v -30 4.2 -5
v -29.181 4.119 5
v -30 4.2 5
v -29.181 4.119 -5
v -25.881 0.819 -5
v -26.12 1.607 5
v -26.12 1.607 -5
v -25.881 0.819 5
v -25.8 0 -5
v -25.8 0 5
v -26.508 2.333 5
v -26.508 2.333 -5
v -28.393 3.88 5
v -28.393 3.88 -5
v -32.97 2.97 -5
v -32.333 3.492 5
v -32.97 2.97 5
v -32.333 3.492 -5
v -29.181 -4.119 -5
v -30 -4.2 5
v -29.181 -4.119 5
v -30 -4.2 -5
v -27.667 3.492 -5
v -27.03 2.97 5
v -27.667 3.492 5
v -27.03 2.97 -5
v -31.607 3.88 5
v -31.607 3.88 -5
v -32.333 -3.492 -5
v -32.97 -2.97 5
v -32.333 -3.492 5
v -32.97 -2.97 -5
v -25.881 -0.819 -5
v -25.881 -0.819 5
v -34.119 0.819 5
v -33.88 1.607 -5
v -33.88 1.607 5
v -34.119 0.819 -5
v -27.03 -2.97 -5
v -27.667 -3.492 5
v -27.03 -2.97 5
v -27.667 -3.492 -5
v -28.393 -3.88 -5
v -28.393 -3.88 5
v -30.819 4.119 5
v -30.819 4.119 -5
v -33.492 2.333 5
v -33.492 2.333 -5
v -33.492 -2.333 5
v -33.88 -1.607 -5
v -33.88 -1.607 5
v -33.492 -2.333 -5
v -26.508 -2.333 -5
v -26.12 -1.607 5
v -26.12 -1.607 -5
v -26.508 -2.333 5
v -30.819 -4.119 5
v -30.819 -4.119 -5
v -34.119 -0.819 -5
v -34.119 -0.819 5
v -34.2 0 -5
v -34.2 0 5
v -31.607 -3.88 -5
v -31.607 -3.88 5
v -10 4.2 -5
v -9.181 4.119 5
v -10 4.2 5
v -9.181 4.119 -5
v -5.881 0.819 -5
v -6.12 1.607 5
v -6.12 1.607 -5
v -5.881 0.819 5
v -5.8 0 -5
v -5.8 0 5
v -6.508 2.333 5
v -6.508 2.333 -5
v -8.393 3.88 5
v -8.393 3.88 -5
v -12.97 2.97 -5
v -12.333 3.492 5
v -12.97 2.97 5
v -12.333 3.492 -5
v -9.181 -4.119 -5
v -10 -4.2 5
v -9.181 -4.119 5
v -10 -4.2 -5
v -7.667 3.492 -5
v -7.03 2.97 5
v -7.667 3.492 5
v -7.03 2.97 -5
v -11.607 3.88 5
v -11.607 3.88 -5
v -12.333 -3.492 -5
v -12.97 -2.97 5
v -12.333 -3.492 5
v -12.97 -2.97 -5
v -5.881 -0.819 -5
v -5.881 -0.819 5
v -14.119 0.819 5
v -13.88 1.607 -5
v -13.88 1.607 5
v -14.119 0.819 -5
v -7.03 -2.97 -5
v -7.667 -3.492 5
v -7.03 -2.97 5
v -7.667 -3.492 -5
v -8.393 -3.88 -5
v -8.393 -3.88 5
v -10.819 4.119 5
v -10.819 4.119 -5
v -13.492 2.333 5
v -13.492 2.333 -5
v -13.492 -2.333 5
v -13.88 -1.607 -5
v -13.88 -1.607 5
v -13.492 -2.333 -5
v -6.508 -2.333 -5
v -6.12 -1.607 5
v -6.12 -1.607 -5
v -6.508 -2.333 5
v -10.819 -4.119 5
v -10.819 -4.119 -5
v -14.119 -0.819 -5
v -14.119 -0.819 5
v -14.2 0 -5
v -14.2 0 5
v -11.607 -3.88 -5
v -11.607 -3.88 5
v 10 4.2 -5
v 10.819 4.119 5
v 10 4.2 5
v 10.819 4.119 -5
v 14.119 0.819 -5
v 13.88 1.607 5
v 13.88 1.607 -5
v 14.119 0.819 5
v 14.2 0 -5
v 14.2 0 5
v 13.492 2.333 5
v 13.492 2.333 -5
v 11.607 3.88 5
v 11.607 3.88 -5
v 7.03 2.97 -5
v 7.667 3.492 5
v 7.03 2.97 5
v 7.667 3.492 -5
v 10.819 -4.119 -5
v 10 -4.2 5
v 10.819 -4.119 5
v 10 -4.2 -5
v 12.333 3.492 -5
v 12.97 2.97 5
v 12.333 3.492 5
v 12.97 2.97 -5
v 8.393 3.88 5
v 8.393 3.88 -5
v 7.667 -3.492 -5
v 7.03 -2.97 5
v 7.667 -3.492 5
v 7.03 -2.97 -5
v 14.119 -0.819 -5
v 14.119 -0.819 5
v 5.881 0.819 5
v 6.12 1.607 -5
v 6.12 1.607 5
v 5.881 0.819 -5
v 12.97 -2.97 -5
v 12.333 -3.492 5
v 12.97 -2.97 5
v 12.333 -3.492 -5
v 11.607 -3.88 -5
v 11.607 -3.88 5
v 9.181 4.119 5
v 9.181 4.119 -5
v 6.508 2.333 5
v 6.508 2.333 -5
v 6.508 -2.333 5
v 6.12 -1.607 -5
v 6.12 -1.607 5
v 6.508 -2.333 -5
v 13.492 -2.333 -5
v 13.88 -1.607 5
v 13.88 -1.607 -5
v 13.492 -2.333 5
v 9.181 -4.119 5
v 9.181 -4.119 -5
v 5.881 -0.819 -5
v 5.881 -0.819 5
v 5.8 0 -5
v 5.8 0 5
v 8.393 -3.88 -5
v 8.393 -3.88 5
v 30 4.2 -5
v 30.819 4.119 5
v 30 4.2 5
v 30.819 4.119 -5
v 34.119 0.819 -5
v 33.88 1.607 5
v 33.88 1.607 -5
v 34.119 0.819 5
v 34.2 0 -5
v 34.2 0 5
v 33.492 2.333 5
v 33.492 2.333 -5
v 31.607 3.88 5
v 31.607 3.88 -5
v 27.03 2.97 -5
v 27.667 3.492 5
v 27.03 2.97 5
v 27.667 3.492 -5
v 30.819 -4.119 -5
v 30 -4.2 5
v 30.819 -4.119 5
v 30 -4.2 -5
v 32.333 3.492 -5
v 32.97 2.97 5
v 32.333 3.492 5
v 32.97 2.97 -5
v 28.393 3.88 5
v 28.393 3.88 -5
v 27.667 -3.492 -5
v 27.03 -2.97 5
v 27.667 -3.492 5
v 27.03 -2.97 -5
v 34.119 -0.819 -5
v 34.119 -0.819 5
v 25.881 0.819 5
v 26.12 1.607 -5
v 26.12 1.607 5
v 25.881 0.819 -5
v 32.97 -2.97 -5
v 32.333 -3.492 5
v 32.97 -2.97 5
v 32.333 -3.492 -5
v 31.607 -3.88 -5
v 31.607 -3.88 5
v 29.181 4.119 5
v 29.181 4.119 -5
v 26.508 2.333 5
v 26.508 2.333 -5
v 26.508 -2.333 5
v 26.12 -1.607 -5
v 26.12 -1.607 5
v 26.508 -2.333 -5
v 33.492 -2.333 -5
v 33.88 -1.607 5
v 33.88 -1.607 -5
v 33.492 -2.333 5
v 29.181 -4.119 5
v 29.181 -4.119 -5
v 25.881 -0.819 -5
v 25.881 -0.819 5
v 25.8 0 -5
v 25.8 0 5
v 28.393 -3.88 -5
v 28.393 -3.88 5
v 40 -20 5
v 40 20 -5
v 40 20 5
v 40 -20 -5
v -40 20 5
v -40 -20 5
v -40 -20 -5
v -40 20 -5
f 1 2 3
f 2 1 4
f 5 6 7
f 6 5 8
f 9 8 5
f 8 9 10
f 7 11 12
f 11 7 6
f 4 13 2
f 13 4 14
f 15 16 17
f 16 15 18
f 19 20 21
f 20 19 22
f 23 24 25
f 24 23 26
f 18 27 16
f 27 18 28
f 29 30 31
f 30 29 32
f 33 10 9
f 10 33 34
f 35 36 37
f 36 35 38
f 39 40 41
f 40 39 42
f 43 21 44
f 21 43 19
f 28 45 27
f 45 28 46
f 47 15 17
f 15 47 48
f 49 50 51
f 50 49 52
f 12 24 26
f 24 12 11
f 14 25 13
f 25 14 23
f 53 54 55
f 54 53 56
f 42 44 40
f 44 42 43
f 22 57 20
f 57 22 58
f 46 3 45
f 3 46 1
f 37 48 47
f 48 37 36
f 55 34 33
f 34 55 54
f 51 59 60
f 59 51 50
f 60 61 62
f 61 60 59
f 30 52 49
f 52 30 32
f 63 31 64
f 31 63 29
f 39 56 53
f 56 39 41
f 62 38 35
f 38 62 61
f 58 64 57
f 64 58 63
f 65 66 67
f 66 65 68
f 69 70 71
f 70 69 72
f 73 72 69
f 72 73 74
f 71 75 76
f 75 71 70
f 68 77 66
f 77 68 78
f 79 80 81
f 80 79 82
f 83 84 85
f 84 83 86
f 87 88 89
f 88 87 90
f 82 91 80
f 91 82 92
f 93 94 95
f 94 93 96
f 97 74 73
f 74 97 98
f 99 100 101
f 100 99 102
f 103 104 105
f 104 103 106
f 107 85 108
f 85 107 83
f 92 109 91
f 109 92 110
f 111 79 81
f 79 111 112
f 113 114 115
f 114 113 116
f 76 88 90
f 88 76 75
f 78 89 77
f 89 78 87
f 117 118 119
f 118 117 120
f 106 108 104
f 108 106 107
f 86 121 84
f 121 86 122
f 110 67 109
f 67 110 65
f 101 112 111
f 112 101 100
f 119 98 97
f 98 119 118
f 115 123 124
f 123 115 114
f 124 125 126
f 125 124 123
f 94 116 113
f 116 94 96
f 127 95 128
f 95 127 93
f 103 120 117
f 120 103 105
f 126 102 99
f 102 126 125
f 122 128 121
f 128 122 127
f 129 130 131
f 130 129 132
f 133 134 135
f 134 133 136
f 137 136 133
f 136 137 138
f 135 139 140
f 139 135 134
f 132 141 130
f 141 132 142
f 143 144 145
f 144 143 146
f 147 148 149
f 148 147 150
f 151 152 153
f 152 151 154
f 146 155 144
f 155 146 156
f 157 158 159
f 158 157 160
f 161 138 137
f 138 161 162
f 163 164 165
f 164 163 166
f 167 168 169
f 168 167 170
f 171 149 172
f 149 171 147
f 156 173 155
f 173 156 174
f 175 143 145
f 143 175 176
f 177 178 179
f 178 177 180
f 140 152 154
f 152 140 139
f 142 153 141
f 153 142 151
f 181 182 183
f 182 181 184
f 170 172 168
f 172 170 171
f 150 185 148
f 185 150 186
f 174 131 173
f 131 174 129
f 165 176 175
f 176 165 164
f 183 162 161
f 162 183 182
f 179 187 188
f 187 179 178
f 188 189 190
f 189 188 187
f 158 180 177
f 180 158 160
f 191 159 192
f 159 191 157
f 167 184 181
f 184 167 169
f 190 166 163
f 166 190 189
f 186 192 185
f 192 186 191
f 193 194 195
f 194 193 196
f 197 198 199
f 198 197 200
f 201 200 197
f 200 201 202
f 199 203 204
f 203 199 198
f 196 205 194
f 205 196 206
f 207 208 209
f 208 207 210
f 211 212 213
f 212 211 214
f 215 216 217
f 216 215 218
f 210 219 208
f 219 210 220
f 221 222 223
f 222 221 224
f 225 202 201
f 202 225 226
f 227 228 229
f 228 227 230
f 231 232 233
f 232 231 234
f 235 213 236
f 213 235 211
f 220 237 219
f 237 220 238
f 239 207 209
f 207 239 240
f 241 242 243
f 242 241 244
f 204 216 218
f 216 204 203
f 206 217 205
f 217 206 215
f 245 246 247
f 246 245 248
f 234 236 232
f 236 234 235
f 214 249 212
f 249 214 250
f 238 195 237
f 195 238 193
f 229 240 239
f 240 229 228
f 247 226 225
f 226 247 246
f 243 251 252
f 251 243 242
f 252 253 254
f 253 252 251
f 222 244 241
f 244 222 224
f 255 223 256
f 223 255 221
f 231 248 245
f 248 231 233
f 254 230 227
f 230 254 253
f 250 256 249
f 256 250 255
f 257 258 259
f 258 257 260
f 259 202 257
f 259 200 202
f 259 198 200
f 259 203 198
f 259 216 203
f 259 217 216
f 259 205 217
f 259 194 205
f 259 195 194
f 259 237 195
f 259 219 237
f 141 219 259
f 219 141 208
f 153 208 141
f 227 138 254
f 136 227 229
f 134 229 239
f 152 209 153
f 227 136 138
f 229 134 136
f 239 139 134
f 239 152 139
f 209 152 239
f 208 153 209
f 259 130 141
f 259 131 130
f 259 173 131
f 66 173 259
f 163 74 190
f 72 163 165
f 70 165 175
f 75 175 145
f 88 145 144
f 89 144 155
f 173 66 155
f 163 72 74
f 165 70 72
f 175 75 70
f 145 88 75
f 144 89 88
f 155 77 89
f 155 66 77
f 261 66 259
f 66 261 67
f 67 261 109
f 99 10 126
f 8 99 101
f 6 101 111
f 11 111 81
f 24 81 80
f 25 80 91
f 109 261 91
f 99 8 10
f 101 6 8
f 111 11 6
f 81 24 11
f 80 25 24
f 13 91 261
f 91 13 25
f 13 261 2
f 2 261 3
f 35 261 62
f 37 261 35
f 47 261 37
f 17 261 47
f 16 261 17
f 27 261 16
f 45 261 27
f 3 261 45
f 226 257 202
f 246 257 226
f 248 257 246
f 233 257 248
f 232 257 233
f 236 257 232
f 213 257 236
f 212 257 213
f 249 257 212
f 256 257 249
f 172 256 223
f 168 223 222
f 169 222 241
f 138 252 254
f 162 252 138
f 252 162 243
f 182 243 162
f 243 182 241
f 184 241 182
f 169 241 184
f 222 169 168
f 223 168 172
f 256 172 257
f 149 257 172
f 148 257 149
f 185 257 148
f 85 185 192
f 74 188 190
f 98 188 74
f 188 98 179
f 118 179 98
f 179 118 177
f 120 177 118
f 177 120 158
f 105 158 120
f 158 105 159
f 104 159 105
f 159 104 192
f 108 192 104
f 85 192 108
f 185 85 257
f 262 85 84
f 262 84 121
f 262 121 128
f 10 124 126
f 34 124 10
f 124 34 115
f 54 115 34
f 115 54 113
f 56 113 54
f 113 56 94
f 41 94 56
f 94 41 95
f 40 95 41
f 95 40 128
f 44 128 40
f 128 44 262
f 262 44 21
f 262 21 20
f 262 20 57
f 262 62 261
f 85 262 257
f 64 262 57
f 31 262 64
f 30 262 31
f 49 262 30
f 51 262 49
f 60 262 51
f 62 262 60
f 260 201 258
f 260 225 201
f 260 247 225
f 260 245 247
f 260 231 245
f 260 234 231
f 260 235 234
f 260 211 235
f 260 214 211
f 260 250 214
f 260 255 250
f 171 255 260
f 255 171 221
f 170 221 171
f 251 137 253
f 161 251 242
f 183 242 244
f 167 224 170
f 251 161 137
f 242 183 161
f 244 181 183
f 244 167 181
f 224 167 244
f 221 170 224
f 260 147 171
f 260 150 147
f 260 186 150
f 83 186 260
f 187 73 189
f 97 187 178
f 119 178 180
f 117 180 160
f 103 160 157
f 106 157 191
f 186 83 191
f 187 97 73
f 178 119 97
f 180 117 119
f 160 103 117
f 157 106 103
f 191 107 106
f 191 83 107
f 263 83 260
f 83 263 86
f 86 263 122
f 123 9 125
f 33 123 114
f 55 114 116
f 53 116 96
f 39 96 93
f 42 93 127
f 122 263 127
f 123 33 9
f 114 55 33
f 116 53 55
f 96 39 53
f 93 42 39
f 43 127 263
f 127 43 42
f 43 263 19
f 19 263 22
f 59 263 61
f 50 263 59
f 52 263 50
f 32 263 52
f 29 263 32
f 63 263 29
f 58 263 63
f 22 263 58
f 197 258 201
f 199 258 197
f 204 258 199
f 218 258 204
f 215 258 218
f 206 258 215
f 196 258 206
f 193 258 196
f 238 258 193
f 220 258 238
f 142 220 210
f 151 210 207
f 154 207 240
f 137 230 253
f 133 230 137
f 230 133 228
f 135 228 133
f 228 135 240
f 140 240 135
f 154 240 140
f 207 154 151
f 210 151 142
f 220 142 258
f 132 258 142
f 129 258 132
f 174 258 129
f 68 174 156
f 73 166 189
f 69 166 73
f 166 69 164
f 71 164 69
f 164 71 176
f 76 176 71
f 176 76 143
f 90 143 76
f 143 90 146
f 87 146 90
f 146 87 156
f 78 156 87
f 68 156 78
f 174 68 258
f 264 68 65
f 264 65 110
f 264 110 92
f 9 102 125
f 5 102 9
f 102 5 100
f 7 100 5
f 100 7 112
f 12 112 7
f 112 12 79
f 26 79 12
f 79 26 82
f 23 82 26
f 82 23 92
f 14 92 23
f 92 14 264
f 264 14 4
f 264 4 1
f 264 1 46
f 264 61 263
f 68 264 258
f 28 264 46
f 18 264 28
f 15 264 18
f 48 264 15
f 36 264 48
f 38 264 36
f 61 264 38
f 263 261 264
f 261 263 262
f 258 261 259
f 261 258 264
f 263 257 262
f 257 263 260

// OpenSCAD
$fn = 32;

// ----------------------------------------------------------------------
// Hole bar, 4 x Ø8.4
// row layout, 10 mm edge offset
// ----------------------------------------------------------------------

// --- parameters (mm) ---
bar_w = 40;    // bar width (Y)
bar_t = 10;    // bar thickness (Z)
holes = 4;     // holes per row
hole_d = 8.4;  // hole diameter
edge = 10;     // offset from the bar end to the first hole
pitch = 20;    // pitch between neighbouring holes

// --- derived feature positions (mm) ---
span = (holes - 1) * pitch;   // = 60   distance between the end holes
bar_l = span + 2 * edge;      // = 80   overall bar length
start_x = -bar_l / 2 + edge;  // = -30   X of the first hole
feature_centers = [
  [start_x + 0 * pitch, 0],
  [start_x + 1 * pitch, 0],
  [start_x + 2 * pitch, 0],
  [start_x + 3 * pitch, 0]
];   // hole centres of the first row

// bar with one row of holes, drilled from feature_centers
difference() {
  translate([-bar_l / 2, -bar_w / 2, -bar_t / 2]) cube([bar_l, bar_w, bar_t]);
  for (centre = feature_centers)
    translate([centre[0], centre[1], 0])
      cylinder(d = hole_d, h = bar_t + 2, center = true);
}
